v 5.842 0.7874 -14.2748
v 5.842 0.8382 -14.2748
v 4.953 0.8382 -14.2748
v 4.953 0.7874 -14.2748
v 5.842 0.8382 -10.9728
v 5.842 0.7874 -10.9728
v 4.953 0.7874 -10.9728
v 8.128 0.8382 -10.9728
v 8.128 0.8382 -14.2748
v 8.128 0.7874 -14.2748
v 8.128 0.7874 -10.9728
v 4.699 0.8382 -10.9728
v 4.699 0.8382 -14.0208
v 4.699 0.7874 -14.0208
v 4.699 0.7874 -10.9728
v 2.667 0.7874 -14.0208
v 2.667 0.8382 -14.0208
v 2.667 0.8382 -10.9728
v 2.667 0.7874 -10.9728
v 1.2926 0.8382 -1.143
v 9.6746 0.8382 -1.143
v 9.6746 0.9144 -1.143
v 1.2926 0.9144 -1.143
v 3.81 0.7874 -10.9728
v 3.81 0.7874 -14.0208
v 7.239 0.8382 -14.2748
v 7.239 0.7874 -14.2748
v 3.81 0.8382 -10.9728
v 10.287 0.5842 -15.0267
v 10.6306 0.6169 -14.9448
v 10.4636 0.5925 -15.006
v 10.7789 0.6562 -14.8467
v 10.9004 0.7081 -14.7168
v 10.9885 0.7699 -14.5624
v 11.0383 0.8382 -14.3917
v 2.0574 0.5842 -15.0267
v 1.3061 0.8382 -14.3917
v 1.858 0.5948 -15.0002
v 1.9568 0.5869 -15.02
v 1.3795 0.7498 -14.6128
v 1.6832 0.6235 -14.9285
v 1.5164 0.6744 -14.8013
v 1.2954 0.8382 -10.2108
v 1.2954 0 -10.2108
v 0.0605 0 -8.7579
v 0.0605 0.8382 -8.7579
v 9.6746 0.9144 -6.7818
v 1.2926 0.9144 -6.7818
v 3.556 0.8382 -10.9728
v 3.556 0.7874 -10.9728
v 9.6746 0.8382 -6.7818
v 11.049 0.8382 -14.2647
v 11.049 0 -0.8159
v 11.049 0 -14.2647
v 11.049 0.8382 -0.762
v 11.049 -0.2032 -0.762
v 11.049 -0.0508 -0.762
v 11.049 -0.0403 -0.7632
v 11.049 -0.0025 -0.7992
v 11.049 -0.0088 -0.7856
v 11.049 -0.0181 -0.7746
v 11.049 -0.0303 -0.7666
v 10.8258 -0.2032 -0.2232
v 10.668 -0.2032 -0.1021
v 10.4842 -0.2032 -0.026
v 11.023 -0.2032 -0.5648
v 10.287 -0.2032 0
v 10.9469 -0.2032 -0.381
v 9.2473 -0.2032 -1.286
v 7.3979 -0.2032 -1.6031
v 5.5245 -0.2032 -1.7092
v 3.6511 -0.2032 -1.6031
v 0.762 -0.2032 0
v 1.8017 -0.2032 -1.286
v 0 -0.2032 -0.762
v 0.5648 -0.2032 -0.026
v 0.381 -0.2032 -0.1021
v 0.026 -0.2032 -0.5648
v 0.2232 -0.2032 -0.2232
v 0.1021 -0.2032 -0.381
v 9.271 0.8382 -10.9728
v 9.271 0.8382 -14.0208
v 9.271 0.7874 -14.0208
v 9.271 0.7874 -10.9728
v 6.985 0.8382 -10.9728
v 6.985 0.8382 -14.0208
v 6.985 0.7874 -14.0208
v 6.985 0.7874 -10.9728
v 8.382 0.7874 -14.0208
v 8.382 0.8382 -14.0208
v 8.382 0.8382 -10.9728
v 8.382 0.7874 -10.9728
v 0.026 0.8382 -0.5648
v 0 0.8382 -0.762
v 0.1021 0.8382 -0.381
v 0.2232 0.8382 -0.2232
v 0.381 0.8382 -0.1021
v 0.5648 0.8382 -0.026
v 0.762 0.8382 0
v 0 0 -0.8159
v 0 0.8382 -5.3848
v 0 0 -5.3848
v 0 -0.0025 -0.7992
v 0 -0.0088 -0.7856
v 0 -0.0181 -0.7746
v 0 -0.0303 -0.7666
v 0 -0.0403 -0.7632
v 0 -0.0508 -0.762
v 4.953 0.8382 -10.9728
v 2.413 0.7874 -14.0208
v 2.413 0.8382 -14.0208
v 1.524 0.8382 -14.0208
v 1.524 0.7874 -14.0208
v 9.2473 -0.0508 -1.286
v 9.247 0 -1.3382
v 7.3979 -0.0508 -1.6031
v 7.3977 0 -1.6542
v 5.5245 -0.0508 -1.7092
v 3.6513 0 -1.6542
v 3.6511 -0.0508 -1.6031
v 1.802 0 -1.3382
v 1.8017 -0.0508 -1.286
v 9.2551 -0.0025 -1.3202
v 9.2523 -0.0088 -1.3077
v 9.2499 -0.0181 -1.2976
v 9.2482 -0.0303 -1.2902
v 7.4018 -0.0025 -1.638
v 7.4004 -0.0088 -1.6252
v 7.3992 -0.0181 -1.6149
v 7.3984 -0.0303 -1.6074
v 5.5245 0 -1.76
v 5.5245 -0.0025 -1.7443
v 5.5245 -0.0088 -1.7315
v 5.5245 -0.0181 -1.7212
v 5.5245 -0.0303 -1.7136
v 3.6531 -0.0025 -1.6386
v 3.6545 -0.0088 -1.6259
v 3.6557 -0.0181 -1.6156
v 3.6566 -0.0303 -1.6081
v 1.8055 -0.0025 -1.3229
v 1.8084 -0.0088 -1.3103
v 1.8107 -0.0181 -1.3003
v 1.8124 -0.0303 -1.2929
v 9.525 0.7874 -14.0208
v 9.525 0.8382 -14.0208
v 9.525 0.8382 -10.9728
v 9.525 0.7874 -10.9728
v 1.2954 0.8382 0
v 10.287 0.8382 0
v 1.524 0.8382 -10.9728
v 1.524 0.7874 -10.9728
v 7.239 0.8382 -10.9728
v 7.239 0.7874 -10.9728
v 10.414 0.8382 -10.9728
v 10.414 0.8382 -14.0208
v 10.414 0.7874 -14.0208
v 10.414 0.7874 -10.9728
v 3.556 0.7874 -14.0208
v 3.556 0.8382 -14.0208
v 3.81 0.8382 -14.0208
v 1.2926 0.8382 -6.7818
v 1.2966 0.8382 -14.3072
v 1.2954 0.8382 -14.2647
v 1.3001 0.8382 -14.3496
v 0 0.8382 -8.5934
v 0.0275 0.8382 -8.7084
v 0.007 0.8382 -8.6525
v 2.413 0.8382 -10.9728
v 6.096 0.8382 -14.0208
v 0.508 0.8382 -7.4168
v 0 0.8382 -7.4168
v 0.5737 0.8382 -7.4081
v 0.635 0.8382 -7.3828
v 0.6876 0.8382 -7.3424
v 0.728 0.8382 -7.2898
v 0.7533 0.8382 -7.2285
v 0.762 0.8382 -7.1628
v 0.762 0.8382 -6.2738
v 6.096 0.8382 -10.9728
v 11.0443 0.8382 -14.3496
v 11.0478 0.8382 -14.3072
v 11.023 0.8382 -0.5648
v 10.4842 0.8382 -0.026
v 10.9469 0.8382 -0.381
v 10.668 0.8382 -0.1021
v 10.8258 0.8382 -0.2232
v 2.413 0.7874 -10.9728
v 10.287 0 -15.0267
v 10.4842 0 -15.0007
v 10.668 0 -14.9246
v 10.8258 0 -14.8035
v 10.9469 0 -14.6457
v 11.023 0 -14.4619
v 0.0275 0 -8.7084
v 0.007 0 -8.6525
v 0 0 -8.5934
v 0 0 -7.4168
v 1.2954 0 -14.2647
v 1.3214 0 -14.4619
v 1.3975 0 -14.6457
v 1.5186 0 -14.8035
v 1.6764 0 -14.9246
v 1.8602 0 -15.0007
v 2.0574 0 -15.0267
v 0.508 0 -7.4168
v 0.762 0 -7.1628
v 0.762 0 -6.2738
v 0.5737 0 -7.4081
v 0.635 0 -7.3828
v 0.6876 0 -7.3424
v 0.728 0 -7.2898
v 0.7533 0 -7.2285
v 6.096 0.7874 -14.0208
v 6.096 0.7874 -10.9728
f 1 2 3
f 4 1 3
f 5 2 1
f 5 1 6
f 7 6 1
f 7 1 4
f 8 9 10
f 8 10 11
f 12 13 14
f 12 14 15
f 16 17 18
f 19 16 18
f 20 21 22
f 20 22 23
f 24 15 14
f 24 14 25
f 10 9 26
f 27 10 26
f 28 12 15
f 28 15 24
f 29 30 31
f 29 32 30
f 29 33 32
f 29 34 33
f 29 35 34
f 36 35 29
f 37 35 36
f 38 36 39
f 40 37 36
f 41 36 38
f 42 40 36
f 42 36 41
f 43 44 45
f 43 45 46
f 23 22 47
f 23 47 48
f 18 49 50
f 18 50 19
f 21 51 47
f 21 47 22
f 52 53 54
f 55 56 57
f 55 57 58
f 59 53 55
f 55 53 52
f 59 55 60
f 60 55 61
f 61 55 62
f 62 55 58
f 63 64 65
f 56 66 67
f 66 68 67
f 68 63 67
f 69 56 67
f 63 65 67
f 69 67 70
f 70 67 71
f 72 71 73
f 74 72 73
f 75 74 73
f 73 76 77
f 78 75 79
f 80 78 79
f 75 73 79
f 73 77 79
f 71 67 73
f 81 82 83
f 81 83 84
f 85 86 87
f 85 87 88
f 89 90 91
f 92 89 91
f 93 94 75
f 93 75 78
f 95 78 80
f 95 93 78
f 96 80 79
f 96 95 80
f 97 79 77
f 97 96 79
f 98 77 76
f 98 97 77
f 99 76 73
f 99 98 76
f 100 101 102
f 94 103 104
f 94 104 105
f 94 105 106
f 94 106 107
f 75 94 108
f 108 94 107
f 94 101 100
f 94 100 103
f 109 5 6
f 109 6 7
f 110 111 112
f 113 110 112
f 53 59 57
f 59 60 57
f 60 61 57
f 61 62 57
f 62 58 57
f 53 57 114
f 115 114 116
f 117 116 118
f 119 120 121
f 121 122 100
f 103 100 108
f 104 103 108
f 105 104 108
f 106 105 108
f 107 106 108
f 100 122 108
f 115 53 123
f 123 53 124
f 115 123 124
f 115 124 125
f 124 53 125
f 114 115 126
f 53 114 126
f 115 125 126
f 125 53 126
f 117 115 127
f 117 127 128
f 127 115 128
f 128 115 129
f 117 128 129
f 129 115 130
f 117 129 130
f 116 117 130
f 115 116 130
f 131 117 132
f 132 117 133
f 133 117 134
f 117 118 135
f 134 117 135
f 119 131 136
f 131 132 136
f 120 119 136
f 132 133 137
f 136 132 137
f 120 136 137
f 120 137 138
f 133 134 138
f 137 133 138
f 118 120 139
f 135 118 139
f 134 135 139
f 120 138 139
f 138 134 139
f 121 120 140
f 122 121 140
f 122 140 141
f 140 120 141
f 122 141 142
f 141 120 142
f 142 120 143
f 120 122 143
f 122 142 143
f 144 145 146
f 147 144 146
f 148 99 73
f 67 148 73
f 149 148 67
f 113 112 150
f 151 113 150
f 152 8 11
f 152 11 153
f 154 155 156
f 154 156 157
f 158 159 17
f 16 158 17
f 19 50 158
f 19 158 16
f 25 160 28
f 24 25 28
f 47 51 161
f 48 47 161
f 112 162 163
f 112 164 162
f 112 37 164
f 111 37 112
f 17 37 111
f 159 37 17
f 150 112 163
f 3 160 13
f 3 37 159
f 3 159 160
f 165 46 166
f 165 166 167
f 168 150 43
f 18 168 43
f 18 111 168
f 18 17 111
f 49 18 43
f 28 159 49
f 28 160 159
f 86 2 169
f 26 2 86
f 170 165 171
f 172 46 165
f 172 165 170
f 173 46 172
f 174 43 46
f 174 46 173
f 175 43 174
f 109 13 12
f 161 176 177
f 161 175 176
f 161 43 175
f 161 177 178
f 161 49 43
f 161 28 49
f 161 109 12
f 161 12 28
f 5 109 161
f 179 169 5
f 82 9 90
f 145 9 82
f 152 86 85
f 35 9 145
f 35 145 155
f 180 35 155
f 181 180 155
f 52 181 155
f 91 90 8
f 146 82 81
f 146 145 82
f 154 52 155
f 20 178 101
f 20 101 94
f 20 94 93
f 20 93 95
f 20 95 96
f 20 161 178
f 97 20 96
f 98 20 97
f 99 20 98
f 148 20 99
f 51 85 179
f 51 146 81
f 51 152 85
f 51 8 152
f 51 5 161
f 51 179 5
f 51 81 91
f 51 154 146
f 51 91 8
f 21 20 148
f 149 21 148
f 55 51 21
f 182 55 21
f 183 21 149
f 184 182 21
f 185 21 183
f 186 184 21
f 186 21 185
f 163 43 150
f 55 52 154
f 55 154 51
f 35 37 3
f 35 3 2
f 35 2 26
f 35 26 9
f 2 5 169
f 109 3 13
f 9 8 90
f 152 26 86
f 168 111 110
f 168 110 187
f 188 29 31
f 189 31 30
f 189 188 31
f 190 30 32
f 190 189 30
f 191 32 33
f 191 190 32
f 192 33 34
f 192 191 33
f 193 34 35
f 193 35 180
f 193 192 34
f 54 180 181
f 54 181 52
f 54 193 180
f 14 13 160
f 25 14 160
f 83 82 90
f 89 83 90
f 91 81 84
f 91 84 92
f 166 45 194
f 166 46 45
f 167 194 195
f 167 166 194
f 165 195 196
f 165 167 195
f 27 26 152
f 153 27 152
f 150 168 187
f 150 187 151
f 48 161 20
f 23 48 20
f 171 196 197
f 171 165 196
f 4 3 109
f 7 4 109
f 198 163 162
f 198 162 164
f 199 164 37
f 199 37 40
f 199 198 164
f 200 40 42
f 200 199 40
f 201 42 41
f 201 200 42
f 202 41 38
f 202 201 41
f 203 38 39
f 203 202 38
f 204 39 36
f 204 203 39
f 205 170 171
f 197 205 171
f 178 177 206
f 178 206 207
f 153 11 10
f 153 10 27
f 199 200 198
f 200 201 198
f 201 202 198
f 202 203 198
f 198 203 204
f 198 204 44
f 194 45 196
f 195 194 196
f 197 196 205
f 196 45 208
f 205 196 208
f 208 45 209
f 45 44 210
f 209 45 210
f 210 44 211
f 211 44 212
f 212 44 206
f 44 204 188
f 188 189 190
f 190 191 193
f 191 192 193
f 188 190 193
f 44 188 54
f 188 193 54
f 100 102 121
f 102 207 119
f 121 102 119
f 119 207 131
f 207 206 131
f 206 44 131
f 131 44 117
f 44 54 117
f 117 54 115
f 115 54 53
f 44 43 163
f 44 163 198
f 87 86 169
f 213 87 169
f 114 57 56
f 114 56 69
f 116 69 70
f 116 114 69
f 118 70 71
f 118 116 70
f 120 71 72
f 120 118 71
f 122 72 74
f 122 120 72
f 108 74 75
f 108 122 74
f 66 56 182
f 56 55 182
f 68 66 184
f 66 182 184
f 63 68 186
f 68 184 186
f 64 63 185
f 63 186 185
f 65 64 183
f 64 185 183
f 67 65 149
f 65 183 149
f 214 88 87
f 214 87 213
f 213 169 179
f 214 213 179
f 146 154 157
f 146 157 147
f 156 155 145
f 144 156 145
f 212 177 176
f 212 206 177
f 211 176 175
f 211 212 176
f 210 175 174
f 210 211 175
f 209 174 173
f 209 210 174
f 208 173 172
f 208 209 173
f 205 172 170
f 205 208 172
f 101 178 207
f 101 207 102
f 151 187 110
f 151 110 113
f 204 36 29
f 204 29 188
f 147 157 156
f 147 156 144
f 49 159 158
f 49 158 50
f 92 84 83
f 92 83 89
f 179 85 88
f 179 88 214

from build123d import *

# Parameters (mm, degrees)
BOSS_EXTRUDE1_DEPTH = 9.753600003
SKETCH2_W           = 8.686799997
SKETCH2_H           = 0.8382
BOSS_EXTRUDE2_DEPTH = 1.295399997
BOSS_EXTRUDE3_DEPTH = 0.2032
SKETCH4_W           = 0.762
SKETCH4_H           = 2.032
CUT_EXTRUDE1_DEPTH  = 19.680648463
SKETCH5_W           = 8.382
SKETCH5_H           = 5.6388
BOSS_EXTRUDE4_DEPTH = 0.0762
SKETCH6_W           = 0.889000002
SKETCH6_H           = 3.048
CUT_EXTRUDE2_DEPTH  = 0.0508
SKETCH7_W           = 0.889
SKETCH7_H           = 3.048
CUT_EXTRUDE3_DEPTH  = 0.0508
SKETCH8_W           = 0.889
SKETCH8_H           = 3.048
CUT_EXTRUDE4_DEPTH  = 0.0508
SKETCH9_W           = 0.889
SKETCH9_H           = 3.048
CUT_EXTRUDE5_DEPTH  = 0.0508
SKETCH10_W          = 0.889
SKETCH10_H          = 3.048
CUT_EXTRUDE6_DEPTH  = 0.0508
SKETCH11_W          = 0.888999999
SKETCH11_H          = 3.301999998
CUT_EXTRUDE7_DEPTH  = 0.0508
SKETCH12_W          = 0.888999999
SKETCH12_H          = 3.301999998
CUT_EXTRUDE8_DEPTH  = 0.0508
SKETCH13_W          = 0.889
SKETCH13_H          = 3.048
CUT_EXTRUDE9_DEPTH  = 0.0508
DRAFT1_ANGLE        = 49.398705355
DRAFT2_ANGLE        = 49.635463485
FILLET2_R           = 0.050800005
FILLET3_R           = 0.254
FILLET4_R           = 0.762


with BuildPart() as part:
    # Sketch1 → Boss-Extrude1 (new body)
    with BuildSketch(Plane(origin=(1.2954, 0, 0), x_dir=(0, -1, 0), z_dir=(-1, 0, 0))):
        Polygon((-0.8382, 0), (-0.8382, -14.391699969), (-0.5842, -15.026699969), (0, -15.026699969), (0, 0), align=None)
    extrude(amount=-BOSS_EXTRUDE1_DEPTH)

    # Sketch2 → Boss-Extrude2 (add)
    with BuildSketch(Plane.ZY.offset(-1.2954)):
        with Locations((-4.343399999, 0.4191)):
            Rectangle(SKETCH2_W, SKETCH2_H)
    extrude(amount=BOSS_EXTRUDE2_DEPTH)

    # Sketch3 → Boss-Extrude3 (add)
    with BuildSketch(Plane.XZ):
        with BuildLine():
            Line((0, -0.762000007), (0, 0))
            Line((0, 0), (11.049, 0))
            Line((11.049, 0), (11.049, -0.762000007))
            ThreePointArc((11.049, -0.762000007), (5.5245, -1.709233412), (0, -0.762000007))
        make_face()
    extrude(amount=BOSS_EXTRUDE3_DEPTH)

    # Sketch4 → Cut-Extrude1 (cut, through all)
    with BuildSketch(Plane(origin=(0, 0.8382, 0), x_dir=(-1, 0, 0), z_dir=(0, 1, 0))):
        with Locations((-0.381, -6.4008)):
            Rectangle(SKETCH4_W, SKETCH4_H)
    extrude(amount=-CUT_EXTRUDE1_DEPTH, mode=Mode.SUBTRACT)

    # Sketch5 → Boss-Extrude4 (add)
    with BuildSketch(Plane(origin=(0, 0.8382, 0), x_dir=(-1, 0, 0), z_dir=(0, 1, 0))):
        with Locations((-5.483604679, -3.9624)):
            Rectangle(SKETCH5_W, SKETCH5_H)
    extrude(amount=BOSS_EXTRUDE4_DEPTH)

    # Sketch6 → Cut-Extrude2 (cut)
    with BuildSketch(Plane(origin=(0, 0.8382, 0), x_dir=(-1, 0, 0), z_dir=(0, 1, 0))):
        with Locations((-1.9685, -12.496800003)):
            Rectangle(SKETCH6_W, SKETCH6_H)
    extrude(amount=-CUT_EXTRUDE2_DEPTH, mode=Mode.SUBTRACT)

    # Sketch7 → Cut-Extrude3 (cut)
    with BuildSketch(Plane(origin=(0, 0.8382, 0), x_dir=(-1, 0, 0), z_dir=(0, 1, 0))):
        with Locations((-4.254499999, -12.496800003)):
            Rectangle(SKETCH7_W, SKETCH7_H)
    extrude(amount=-CUT_EXTRUDE3_DEPTH, mode=Mode.SUBTRACT)

    # Sketch8 → Cut-Extrude4 (cut)
    with BuildSketch(Plane(origin=(0, 0.8382, 0), x_dir=(-1, 0, 0), z_dir=(0, 1, 0))):
        with Locations((-3.111499999, -12.496800003)):
            Rectangle(SKETCH8_W, SKETCH8_H)
    extrude(amount=-CUT_EXTRUDE4_DEPTH, mode=Mode.SUBTRACT)

    # Sketch9 → Cut-Extrude5 (cut)
    with BuildSketch(Plane(origin=(0, 0.8382, 0), x_dir=(-1, 0, 0), z_dir=(0, 1, 0))):
        with Locations((-9.969500001, -12.496800003)):
            Rectangle(SKETCH9_W, SKETCH9_H)
    extrude(amount=-CUT_EXTRUDE5_DEPTH, mode=Mode.SUBTRACT)

    # Sketch10 → Cut-Extrude6 (cut)
    with BuildSketch(Plane(origin=(0, 0.8382, 0), x_dir=(-1, 0, 0), z_dir=(0, 1, 0))):
        with Locations((-6.5405, -12.496800003)):
            Rectangle(SKETCH10_W, SKETCH10_H)
    extrude(amount=-CUT_EXTRUDE6_DEPTH, mode=Mode.SUBTRACT)

    # Sketch11 → Cut-Extrude7 (cut)
    with BuildSketch(Plane(origin=(0, 0.8382, 0), x_dir=(-1, 0, 0), z_dir=(0, 1, 0))):
        with Locations((-5.3975, -12.623800002)):
            Rectangle(SKETCH11_W, SKETCH11_H)
    extrude(amount=-CUT_EXTRUDE7_DEPTH, mode=Mode.SUBTRACT)

    # Sketch12 → Cut-Extrude8 (cut)
    with BuildSketch(Plane(origin=(0, 0.8382, 0), x_dir=(-1, 0, 0), z_dir=(0, 1, 0))):
        with Locations((-7.683500001, -12.623800002)):
            Rectangle(SKETCH12_W, SKETCH12_H)
    extrude(amount=-CUT_EXTRUDE8_DEPTH, mode=Mode.SUBTRACT)

    # Sketch13 → Cut-Extrude9 (cut)
    with BuildSketch(Plane(origin=(0, 0.8382, 0), x_dir=(-1, 0, 0), z_dir=(0, 1, 0))):
        with Locations((-8.826500001, -12.496800003)):
            Rectangle(SKETCH13_W, SKETCH13_H)
    extrude(amount=-CUT_EXTRUDE9_DEPTH, mode=Mode.SUBTRACT)

    # Draft1
    draft1_faces = [part.faces().sort_by_distance(p)[0] for p in [
        (0.381, 0.4191, -5.3848),
    ]]
    draft(draft1_faces, Plane(origin=(3e-09, 0, 0), x_dir=(0, 0, -1), z_dir=(-1, 0, 0)), DRAFT1_ANGLE)

    # Draft2
    draft2_faces = [part.faces().sort_by_distance(p)[0] for p in [
        (0.647700002, 0.4191, -8.686799997),
    ]]
    draft(draft2_faces, Plane(origin=(3e-09, 0, 0), x_dir=(0, 0, -1), z_dir=(-1, 0, 0)), DRAFT2_ANGLE)

    # Fillet2
    fillet2_edges = [part.edges().sort_by_distance(p)[0] for p in [
        (5.5245, 0, -1.709233412),
    ]]
    fillet(fillet2_edges, radius=FILLET2_R)

    # Fillet3
    fillet3_edges = [part.edges().sort_by_distance(p)[0] for p in [
        (3e-09, 0.4191, -8.686799997),
        (0.762, 0.4191, -7.4168),
    ]]
    fillet(fillet3_edges, radius=FILLET3_R)

    # Fillet4
    fillet4_edges = [part.edges().sort_by_distance(p)[0] for p in [
        (3e-09, 0.4191, 0),
        (11.049000003, 0.2921, -15.026699969),
        (11.049000003, 0.4191, 0),
        (1.2954, 0.2921, -15.026699969),
    ]]
    fillet(fillet4_edges, radius=FILLET4_R)


solid = part.part
